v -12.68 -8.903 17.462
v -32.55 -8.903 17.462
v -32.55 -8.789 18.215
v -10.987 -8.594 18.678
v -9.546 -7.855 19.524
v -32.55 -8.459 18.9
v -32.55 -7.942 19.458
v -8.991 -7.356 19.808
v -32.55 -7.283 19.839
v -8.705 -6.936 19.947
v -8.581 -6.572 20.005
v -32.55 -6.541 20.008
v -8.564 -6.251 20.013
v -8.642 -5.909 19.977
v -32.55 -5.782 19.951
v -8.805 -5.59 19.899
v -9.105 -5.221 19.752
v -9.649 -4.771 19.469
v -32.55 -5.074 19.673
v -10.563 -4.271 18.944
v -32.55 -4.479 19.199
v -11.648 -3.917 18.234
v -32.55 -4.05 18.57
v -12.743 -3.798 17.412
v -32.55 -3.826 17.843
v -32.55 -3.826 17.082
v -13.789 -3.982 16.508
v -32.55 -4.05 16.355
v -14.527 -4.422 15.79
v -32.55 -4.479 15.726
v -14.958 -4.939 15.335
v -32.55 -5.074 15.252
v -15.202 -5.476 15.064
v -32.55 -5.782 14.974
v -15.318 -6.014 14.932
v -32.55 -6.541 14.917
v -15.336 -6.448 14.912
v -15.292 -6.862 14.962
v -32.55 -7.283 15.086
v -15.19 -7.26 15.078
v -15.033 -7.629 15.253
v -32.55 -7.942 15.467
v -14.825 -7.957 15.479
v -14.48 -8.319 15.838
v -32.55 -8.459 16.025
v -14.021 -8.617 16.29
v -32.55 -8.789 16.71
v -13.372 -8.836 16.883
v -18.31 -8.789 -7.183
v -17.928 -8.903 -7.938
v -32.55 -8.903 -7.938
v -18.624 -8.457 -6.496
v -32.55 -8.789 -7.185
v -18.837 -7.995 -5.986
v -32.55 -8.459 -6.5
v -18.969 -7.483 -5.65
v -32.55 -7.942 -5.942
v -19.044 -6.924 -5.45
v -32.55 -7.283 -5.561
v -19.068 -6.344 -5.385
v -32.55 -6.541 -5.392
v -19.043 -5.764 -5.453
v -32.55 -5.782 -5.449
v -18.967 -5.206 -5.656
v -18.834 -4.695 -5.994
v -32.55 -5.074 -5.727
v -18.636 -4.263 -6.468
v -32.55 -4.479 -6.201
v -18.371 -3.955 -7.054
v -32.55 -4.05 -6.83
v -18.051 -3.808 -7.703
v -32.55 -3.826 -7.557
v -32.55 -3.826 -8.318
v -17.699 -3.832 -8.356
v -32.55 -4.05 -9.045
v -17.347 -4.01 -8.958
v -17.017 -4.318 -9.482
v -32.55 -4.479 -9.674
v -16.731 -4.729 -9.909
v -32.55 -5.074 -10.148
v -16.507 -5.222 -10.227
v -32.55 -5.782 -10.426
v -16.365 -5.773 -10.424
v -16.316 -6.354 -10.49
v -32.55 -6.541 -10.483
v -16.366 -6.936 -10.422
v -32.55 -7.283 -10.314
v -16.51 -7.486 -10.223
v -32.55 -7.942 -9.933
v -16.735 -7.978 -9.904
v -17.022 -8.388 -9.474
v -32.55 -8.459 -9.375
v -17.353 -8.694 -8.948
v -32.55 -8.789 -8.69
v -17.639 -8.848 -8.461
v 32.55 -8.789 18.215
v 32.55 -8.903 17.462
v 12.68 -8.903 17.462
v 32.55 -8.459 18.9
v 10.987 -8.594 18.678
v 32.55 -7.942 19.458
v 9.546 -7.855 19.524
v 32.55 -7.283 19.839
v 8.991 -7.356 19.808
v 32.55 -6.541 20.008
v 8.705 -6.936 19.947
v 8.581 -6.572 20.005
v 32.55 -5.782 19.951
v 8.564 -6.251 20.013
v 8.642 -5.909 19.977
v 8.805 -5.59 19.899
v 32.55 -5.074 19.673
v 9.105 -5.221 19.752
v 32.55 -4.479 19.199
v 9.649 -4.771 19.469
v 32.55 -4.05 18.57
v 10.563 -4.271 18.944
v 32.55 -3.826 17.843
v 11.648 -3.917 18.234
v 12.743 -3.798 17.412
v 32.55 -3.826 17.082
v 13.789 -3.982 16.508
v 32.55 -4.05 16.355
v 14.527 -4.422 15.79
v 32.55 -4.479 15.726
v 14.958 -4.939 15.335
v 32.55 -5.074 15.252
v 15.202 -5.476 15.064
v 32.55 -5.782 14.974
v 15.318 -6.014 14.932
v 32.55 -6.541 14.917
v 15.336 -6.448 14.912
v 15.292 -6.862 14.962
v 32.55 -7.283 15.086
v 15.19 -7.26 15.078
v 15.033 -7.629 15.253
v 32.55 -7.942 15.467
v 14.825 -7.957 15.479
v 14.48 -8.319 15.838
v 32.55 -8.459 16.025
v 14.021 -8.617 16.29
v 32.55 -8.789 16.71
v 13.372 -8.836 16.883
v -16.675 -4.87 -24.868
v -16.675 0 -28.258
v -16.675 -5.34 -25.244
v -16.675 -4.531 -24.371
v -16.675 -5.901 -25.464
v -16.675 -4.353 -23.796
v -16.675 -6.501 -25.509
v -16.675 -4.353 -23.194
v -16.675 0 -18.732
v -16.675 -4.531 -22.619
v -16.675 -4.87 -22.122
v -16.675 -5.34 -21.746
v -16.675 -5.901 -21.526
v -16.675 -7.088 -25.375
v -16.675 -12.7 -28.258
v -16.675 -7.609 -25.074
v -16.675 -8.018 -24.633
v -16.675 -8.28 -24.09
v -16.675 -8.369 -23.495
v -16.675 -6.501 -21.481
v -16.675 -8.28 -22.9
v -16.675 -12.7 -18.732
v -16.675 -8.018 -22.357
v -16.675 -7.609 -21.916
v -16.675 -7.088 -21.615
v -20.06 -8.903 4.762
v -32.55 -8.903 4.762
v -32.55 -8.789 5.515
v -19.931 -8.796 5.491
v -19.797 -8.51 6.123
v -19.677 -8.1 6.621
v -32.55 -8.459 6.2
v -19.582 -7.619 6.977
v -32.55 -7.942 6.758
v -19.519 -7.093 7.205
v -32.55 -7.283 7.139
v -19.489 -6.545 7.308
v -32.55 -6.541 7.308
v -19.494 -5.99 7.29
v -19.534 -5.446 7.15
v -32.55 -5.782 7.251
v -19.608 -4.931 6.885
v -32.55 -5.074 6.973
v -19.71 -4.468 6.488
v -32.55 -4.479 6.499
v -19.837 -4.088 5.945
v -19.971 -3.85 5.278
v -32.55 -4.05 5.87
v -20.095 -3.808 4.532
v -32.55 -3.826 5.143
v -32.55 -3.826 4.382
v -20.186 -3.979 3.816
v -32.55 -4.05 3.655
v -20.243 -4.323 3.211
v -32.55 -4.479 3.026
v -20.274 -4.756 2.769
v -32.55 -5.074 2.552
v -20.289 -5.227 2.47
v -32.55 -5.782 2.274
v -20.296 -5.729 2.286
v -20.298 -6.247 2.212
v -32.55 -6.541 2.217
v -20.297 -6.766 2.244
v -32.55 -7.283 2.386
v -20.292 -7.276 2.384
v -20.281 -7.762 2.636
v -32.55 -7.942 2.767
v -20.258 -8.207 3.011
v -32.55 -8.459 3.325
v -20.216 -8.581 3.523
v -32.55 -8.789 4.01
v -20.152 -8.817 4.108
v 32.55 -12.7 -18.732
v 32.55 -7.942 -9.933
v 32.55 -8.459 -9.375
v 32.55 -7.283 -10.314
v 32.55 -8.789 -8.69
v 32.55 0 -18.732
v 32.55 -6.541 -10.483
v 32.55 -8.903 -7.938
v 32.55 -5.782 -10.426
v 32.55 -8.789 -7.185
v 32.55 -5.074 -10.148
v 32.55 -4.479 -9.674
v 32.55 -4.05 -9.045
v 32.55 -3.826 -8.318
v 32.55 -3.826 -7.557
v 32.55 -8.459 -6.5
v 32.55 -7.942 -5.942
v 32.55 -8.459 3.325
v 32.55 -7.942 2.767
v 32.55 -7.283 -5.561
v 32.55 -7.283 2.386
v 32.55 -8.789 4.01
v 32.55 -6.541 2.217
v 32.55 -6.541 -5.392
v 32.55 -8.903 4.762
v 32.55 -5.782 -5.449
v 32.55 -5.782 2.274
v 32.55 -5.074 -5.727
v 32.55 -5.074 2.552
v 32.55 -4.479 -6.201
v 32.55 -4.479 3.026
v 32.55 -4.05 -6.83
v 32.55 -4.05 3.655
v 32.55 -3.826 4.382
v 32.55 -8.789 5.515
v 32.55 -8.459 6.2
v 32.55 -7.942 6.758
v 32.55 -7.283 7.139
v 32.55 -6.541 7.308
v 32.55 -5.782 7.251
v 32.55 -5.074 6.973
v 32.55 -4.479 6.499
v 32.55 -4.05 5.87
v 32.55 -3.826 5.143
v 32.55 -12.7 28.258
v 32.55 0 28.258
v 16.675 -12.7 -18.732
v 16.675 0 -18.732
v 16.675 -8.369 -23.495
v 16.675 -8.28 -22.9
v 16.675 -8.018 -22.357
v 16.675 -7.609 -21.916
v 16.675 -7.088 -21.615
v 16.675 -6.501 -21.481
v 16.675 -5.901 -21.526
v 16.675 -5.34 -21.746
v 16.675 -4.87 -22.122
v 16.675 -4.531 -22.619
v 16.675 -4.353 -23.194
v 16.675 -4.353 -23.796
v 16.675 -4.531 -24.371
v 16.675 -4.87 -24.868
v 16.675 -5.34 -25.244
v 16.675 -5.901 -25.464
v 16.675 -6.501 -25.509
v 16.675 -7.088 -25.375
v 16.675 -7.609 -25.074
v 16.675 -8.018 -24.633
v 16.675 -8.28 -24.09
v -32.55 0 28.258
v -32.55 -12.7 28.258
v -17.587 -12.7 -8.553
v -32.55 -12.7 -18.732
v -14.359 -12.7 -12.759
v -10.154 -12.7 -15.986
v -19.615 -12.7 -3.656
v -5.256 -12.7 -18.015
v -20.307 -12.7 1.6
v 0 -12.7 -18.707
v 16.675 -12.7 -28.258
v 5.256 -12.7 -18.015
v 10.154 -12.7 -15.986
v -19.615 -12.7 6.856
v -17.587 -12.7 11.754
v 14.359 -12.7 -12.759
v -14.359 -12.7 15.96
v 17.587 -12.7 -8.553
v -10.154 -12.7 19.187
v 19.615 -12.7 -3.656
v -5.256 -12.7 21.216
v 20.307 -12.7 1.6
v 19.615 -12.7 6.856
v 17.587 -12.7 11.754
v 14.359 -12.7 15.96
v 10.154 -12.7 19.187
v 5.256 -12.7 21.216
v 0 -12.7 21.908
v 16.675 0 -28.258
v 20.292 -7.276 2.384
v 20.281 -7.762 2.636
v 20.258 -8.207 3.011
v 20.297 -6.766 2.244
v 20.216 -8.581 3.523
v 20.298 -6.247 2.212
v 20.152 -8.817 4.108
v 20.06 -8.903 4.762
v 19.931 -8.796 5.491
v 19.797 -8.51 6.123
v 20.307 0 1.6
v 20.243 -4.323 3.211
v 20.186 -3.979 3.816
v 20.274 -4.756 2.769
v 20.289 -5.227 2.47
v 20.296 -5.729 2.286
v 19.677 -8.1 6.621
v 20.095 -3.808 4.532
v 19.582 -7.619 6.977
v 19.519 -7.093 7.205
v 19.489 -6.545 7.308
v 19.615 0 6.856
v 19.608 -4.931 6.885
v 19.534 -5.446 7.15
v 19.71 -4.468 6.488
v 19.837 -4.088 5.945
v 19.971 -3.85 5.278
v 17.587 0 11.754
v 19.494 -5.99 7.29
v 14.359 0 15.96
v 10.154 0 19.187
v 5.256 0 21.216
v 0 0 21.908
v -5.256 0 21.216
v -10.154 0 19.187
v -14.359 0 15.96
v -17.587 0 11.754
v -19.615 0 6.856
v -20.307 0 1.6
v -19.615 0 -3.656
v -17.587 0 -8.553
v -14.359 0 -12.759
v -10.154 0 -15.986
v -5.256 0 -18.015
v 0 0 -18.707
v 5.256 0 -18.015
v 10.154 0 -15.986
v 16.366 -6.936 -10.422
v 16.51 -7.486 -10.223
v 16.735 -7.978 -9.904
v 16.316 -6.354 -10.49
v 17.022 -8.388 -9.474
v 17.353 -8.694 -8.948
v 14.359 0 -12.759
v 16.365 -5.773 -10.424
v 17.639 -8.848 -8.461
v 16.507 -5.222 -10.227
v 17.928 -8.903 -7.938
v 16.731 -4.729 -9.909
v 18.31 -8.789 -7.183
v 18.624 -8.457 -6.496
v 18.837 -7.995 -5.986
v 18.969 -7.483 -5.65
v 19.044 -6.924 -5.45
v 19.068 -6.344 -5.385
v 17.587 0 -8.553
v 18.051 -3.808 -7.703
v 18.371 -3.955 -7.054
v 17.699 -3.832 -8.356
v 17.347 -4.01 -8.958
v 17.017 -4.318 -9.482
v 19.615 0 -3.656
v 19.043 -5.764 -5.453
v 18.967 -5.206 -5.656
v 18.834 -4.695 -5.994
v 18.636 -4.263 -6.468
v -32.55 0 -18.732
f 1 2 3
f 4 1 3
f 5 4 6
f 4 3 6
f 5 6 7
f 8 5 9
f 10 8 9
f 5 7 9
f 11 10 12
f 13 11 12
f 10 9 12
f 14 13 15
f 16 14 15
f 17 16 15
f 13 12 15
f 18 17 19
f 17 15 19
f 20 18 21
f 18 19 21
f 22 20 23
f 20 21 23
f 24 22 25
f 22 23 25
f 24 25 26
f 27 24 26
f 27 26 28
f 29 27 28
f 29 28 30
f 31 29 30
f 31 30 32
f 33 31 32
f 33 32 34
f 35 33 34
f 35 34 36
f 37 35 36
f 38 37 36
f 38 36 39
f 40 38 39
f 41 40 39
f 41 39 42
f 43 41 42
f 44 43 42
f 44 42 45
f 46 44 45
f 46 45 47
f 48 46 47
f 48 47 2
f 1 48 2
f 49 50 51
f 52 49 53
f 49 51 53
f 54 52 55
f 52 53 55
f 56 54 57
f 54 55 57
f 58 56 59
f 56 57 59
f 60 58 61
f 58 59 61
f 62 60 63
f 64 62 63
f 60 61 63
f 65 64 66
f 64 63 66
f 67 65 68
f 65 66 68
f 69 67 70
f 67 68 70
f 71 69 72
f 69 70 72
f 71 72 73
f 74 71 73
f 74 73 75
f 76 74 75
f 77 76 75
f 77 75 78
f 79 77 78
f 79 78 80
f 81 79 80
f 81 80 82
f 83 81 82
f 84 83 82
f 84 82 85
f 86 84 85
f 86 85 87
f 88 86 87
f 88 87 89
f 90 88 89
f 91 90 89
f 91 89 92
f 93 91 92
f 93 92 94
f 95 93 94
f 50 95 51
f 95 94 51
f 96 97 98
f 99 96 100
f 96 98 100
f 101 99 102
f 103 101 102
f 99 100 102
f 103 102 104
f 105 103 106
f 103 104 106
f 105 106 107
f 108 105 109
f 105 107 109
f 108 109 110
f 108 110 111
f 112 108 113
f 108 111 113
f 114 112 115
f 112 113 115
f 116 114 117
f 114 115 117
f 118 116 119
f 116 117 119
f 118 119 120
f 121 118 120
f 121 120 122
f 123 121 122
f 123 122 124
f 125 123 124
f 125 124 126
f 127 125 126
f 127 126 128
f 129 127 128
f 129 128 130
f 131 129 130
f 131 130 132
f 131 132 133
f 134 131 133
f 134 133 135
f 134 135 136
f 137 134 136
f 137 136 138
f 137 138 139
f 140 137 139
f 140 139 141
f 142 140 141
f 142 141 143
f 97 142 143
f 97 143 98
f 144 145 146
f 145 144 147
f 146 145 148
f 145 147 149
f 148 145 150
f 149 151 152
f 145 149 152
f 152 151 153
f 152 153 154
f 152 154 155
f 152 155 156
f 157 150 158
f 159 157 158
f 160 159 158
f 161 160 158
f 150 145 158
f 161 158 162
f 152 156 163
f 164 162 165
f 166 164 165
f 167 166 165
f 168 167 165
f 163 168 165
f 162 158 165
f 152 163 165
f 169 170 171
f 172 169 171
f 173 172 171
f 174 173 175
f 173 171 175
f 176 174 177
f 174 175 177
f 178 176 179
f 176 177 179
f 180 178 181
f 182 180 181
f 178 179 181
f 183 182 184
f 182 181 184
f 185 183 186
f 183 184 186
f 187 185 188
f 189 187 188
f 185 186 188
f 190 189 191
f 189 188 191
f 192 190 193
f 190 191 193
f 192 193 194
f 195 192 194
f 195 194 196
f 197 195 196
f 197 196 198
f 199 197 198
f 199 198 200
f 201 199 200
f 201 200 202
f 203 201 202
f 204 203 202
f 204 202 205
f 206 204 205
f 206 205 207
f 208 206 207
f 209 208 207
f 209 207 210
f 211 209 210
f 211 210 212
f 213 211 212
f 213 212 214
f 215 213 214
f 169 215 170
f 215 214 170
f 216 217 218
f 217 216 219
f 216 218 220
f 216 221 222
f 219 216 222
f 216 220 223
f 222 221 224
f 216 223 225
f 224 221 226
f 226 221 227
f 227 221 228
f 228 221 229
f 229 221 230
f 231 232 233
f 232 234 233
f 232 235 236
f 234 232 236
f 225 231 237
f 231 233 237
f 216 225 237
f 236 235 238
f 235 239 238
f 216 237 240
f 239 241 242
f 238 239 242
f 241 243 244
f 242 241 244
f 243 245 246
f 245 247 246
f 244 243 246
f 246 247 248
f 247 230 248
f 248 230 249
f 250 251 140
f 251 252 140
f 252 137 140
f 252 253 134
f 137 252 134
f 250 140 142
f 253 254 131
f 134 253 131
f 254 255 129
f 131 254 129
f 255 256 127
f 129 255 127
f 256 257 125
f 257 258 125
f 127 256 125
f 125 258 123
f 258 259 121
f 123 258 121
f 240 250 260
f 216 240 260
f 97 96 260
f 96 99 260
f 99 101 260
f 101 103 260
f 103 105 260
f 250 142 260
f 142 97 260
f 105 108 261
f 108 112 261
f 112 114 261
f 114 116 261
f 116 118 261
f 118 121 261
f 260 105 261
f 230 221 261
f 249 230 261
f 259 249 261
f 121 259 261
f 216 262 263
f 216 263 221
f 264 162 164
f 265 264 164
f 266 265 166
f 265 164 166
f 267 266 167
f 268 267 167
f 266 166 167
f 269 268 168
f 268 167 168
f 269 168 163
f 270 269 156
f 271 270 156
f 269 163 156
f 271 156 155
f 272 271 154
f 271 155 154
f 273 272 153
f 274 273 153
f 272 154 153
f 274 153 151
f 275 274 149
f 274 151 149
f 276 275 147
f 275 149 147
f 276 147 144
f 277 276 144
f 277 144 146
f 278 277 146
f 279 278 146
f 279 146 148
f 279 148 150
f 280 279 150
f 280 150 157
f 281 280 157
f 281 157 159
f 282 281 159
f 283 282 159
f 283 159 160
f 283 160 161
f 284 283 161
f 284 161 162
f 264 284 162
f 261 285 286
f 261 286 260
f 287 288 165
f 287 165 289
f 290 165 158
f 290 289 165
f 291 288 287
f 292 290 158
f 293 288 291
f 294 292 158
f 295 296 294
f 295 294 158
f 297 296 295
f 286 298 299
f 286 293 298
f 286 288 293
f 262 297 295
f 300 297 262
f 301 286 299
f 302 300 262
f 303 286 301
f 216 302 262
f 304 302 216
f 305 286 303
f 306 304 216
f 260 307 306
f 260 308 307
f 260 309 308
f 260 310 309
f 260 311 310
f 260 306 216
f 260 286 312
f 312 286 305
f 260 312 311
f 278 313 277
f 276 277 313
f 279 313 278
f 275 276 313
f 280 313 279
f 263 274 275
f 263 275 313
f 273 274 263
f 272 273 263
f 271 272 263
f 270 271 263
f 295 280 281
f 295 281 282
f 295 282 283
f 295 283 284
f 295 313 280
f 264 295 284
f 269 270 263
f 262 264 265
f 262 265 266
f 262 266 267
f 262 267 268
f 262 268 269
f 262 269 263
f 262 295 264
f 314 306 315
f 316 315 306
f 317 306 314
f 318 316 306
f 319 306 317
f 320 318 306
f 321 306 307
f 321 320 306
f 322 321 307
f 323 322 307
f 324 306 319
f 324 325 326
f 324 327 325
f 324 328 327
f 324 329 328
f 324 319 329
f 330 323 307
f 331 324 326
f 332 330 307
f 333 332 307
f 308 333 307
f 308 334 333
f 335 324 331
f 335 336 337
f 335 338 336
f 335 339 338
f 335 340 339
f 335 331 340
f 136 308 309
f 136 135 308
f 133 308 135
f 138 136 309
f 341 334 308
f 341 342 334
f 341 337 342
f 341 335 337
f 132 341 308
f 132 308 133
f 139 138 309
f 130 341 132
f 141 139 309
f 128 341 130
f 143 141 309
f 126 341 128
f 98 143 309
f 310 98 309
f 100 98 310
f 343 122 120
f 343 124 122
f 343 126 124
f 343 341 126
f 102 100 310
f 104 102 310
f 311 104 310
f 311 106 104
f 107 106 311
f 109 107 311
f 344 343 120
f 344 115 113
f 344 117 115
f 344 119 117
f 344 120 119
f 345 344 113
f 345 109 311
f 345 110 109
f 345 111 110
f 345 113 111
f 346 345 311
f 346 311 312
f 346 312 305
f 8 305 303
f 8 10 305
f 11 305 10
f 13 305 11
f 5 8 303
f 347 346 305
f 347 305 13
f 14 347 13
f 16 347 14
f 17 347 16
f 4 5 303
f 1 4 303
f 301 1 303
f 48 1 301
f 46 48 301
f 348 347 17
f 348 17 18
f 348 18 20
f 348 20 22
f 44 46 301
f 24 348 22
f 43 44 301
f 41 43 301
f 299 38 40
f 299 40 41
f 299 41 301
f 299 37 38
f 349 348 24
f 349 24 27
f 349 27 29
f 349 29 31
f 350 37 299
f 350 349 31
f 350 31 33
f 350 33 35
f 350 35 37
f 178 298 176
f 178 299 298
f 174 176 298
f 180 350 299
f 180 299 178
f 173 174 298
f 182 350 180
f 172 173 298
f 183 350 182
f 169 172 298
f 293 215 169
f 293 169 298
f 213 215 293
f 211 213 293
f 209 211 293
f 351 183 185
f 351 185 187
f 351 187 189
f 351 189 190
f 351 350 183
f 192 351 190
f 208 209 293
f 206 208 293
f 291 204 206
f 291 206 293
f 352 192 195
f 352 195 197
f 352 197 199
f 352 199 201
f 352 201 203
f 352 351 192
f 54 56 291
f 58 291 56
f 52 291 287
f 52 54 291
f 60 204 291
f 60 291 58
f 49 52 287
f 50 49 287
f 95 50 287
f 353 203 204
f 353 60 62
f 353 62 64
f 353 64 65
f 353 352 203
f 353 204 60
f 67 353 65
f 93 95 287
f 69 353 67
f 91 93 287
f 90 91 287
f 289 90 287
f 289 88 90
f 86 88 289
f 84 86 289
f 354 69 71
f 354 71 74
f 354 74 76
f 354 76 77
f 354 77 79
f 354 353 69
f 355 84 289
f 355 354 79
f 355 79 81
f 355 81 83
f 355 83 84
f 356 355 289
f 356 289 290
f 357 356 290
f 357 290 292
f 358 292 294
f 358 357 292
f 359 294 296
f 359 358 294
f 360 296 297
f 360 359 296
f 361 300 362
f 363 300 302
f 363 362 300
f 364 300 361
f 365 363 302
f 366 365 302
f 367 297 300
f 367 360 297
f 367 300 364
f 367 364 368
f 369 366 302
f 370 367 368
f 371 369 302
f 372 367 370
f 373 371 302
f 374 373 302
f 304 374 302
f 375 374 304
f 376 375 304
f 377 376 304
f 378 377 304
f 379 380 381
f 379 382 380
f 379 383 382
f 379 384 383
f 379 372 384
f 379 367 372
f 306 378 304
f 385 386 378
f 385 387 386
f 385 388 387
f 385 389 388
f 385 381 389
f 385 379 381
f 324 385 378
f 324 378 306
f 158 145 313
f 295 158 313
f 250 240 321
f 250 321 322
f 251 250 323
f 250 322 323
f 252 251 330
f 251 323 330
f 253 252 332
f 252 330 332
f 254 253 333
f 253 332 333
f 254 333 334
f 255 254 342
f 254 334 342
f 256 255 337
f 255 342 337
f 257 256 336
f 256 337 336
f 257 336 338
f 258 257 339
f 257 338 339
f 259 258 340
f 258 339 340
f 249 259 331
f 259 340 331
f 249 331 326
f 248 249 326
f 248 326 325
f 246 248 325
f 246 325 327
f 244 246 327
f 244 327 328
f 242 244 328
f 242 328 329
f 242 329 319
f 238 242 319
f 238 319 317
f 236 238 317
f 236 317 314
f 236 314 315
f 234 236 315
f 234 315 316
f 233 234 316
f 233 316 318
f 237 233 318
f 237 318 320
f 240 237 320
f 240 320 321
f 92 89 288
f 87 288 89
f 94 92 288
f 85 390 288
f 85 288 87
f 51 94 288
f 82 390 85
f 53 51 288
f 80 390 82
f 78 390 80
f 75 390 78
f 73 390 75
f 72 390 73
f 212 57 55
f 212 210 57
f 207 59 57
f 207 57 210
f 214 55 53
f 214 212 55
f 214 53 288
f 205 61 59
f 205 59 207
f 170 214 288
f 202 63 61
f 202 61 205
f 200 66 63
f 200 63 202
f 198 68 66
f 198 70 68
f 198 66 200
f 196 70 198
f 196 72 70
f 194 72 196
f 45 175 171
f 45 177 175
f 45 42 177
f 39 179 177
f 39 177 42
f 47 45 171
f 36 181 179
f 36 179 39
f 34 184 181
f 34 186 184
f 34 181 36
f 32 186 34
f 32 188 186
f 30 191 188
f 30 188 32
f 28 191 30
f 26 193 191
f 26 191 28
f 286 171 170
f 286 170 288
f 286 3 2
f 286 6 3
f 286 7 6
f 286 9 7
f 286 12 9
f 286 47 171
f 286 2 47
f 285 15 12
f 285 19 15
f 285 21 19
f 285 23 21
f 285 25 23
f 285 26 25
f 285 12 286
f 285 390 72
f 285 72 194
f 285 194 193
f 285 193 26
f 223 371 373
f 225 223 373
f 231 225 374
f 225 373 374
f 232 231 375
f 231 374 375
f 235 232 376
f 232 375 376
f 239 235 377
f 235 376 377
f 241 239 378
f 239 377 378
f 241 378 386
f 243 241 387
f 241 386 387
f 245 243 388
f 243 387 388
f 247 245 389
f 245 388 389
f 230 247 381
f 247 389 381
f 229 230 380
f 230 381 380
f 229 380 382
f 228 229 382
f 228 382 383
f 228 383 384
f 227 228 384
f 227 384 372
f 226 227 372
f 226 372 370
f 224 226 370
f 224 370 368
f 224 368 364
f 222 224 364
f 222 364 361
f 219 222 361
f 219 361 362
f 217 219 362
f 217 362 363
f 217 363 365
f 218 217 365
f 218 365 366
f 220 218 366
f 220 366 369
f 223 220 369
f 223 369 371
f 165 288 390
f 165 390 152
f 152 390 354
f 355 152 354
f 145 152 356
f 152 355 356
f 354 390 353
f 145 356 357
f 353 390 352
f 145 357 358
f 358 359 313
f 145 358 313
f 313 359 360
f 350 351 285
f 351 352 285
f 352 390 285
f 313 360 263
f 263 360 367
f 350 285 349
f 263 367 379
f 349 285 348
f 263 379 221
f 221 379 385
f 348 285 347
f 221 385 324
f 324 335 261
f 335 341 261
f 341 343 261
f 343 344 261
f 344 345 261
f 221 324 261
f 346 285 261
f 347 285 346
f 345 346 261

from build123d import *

# Parameters (mm, degrees)
F0_W     = 65.1002
F0_H     = 56.515
F0_R     = 20.3073
F1_DEPTH = 12.7
F2_W     = 15.875
F2_H     = 9.525
F3_DEPTH = 12.701
F4_R     = 2.5527
F5_DEPTH = 65.1012
F6_R     = 2.0193
F7_DEPTH = 49.2262


with BuildPart() as f1:
    # F0 (on Front) → F1 (new body)
    with BuildSketch(Plane.XZ):
        Rectangle(F0_W, F0_H)
        with Locations((0, 1.6002)):
            Circle(F0_R, mode=Mode.SUBTRACT)
    extrude(amount=F1_DEPTH)

    # F2 (on face) → F3 (cut, through all)
    with BuildSketch(Plane.XZ.offset(12.7)):
        with Locations((-24.6126, -23.495)):
            Rectangle(F2_W, F2_H)
        with Locations((24.6126, -23.495)):
            Rectangle(F2_W, F2_H)
    extrude(amount=-F3_DEPTH, mode=Mode.SUBTRACT)

    # F4 (on face) → F5 (cut, through all)
    with BuildSketch(Plane(origin=(-32.5501, 0, 0), x_dir=(0, -1, 0), z_dir=(-1, 0, 0))):
        with Locations((6.35, 17.4625)):
            Circle(F4_R)
        with Locations((6.35, -7.9375)):
            Circle(F4_R)
        with Locations((6.35, 4.7625)):
            Circle(F4_R)
    extrude(amount=-F5_DEPTH, mode=Mode.SUBTRACT)

    # F6 (on face) → F7 (cut, through all)
    with BuildSketch(Plane(origin=(-16.6751, 0, 0), x_dir=(0, -1, 0), z_dir=(-1, 0, 0))):
        with Locations((6.35, -23.495)):
            Circle(F6_R)
    extrude(amount=-F7_DEPTH, mode=Mode.SUBTRACT)


solid = f1.part
